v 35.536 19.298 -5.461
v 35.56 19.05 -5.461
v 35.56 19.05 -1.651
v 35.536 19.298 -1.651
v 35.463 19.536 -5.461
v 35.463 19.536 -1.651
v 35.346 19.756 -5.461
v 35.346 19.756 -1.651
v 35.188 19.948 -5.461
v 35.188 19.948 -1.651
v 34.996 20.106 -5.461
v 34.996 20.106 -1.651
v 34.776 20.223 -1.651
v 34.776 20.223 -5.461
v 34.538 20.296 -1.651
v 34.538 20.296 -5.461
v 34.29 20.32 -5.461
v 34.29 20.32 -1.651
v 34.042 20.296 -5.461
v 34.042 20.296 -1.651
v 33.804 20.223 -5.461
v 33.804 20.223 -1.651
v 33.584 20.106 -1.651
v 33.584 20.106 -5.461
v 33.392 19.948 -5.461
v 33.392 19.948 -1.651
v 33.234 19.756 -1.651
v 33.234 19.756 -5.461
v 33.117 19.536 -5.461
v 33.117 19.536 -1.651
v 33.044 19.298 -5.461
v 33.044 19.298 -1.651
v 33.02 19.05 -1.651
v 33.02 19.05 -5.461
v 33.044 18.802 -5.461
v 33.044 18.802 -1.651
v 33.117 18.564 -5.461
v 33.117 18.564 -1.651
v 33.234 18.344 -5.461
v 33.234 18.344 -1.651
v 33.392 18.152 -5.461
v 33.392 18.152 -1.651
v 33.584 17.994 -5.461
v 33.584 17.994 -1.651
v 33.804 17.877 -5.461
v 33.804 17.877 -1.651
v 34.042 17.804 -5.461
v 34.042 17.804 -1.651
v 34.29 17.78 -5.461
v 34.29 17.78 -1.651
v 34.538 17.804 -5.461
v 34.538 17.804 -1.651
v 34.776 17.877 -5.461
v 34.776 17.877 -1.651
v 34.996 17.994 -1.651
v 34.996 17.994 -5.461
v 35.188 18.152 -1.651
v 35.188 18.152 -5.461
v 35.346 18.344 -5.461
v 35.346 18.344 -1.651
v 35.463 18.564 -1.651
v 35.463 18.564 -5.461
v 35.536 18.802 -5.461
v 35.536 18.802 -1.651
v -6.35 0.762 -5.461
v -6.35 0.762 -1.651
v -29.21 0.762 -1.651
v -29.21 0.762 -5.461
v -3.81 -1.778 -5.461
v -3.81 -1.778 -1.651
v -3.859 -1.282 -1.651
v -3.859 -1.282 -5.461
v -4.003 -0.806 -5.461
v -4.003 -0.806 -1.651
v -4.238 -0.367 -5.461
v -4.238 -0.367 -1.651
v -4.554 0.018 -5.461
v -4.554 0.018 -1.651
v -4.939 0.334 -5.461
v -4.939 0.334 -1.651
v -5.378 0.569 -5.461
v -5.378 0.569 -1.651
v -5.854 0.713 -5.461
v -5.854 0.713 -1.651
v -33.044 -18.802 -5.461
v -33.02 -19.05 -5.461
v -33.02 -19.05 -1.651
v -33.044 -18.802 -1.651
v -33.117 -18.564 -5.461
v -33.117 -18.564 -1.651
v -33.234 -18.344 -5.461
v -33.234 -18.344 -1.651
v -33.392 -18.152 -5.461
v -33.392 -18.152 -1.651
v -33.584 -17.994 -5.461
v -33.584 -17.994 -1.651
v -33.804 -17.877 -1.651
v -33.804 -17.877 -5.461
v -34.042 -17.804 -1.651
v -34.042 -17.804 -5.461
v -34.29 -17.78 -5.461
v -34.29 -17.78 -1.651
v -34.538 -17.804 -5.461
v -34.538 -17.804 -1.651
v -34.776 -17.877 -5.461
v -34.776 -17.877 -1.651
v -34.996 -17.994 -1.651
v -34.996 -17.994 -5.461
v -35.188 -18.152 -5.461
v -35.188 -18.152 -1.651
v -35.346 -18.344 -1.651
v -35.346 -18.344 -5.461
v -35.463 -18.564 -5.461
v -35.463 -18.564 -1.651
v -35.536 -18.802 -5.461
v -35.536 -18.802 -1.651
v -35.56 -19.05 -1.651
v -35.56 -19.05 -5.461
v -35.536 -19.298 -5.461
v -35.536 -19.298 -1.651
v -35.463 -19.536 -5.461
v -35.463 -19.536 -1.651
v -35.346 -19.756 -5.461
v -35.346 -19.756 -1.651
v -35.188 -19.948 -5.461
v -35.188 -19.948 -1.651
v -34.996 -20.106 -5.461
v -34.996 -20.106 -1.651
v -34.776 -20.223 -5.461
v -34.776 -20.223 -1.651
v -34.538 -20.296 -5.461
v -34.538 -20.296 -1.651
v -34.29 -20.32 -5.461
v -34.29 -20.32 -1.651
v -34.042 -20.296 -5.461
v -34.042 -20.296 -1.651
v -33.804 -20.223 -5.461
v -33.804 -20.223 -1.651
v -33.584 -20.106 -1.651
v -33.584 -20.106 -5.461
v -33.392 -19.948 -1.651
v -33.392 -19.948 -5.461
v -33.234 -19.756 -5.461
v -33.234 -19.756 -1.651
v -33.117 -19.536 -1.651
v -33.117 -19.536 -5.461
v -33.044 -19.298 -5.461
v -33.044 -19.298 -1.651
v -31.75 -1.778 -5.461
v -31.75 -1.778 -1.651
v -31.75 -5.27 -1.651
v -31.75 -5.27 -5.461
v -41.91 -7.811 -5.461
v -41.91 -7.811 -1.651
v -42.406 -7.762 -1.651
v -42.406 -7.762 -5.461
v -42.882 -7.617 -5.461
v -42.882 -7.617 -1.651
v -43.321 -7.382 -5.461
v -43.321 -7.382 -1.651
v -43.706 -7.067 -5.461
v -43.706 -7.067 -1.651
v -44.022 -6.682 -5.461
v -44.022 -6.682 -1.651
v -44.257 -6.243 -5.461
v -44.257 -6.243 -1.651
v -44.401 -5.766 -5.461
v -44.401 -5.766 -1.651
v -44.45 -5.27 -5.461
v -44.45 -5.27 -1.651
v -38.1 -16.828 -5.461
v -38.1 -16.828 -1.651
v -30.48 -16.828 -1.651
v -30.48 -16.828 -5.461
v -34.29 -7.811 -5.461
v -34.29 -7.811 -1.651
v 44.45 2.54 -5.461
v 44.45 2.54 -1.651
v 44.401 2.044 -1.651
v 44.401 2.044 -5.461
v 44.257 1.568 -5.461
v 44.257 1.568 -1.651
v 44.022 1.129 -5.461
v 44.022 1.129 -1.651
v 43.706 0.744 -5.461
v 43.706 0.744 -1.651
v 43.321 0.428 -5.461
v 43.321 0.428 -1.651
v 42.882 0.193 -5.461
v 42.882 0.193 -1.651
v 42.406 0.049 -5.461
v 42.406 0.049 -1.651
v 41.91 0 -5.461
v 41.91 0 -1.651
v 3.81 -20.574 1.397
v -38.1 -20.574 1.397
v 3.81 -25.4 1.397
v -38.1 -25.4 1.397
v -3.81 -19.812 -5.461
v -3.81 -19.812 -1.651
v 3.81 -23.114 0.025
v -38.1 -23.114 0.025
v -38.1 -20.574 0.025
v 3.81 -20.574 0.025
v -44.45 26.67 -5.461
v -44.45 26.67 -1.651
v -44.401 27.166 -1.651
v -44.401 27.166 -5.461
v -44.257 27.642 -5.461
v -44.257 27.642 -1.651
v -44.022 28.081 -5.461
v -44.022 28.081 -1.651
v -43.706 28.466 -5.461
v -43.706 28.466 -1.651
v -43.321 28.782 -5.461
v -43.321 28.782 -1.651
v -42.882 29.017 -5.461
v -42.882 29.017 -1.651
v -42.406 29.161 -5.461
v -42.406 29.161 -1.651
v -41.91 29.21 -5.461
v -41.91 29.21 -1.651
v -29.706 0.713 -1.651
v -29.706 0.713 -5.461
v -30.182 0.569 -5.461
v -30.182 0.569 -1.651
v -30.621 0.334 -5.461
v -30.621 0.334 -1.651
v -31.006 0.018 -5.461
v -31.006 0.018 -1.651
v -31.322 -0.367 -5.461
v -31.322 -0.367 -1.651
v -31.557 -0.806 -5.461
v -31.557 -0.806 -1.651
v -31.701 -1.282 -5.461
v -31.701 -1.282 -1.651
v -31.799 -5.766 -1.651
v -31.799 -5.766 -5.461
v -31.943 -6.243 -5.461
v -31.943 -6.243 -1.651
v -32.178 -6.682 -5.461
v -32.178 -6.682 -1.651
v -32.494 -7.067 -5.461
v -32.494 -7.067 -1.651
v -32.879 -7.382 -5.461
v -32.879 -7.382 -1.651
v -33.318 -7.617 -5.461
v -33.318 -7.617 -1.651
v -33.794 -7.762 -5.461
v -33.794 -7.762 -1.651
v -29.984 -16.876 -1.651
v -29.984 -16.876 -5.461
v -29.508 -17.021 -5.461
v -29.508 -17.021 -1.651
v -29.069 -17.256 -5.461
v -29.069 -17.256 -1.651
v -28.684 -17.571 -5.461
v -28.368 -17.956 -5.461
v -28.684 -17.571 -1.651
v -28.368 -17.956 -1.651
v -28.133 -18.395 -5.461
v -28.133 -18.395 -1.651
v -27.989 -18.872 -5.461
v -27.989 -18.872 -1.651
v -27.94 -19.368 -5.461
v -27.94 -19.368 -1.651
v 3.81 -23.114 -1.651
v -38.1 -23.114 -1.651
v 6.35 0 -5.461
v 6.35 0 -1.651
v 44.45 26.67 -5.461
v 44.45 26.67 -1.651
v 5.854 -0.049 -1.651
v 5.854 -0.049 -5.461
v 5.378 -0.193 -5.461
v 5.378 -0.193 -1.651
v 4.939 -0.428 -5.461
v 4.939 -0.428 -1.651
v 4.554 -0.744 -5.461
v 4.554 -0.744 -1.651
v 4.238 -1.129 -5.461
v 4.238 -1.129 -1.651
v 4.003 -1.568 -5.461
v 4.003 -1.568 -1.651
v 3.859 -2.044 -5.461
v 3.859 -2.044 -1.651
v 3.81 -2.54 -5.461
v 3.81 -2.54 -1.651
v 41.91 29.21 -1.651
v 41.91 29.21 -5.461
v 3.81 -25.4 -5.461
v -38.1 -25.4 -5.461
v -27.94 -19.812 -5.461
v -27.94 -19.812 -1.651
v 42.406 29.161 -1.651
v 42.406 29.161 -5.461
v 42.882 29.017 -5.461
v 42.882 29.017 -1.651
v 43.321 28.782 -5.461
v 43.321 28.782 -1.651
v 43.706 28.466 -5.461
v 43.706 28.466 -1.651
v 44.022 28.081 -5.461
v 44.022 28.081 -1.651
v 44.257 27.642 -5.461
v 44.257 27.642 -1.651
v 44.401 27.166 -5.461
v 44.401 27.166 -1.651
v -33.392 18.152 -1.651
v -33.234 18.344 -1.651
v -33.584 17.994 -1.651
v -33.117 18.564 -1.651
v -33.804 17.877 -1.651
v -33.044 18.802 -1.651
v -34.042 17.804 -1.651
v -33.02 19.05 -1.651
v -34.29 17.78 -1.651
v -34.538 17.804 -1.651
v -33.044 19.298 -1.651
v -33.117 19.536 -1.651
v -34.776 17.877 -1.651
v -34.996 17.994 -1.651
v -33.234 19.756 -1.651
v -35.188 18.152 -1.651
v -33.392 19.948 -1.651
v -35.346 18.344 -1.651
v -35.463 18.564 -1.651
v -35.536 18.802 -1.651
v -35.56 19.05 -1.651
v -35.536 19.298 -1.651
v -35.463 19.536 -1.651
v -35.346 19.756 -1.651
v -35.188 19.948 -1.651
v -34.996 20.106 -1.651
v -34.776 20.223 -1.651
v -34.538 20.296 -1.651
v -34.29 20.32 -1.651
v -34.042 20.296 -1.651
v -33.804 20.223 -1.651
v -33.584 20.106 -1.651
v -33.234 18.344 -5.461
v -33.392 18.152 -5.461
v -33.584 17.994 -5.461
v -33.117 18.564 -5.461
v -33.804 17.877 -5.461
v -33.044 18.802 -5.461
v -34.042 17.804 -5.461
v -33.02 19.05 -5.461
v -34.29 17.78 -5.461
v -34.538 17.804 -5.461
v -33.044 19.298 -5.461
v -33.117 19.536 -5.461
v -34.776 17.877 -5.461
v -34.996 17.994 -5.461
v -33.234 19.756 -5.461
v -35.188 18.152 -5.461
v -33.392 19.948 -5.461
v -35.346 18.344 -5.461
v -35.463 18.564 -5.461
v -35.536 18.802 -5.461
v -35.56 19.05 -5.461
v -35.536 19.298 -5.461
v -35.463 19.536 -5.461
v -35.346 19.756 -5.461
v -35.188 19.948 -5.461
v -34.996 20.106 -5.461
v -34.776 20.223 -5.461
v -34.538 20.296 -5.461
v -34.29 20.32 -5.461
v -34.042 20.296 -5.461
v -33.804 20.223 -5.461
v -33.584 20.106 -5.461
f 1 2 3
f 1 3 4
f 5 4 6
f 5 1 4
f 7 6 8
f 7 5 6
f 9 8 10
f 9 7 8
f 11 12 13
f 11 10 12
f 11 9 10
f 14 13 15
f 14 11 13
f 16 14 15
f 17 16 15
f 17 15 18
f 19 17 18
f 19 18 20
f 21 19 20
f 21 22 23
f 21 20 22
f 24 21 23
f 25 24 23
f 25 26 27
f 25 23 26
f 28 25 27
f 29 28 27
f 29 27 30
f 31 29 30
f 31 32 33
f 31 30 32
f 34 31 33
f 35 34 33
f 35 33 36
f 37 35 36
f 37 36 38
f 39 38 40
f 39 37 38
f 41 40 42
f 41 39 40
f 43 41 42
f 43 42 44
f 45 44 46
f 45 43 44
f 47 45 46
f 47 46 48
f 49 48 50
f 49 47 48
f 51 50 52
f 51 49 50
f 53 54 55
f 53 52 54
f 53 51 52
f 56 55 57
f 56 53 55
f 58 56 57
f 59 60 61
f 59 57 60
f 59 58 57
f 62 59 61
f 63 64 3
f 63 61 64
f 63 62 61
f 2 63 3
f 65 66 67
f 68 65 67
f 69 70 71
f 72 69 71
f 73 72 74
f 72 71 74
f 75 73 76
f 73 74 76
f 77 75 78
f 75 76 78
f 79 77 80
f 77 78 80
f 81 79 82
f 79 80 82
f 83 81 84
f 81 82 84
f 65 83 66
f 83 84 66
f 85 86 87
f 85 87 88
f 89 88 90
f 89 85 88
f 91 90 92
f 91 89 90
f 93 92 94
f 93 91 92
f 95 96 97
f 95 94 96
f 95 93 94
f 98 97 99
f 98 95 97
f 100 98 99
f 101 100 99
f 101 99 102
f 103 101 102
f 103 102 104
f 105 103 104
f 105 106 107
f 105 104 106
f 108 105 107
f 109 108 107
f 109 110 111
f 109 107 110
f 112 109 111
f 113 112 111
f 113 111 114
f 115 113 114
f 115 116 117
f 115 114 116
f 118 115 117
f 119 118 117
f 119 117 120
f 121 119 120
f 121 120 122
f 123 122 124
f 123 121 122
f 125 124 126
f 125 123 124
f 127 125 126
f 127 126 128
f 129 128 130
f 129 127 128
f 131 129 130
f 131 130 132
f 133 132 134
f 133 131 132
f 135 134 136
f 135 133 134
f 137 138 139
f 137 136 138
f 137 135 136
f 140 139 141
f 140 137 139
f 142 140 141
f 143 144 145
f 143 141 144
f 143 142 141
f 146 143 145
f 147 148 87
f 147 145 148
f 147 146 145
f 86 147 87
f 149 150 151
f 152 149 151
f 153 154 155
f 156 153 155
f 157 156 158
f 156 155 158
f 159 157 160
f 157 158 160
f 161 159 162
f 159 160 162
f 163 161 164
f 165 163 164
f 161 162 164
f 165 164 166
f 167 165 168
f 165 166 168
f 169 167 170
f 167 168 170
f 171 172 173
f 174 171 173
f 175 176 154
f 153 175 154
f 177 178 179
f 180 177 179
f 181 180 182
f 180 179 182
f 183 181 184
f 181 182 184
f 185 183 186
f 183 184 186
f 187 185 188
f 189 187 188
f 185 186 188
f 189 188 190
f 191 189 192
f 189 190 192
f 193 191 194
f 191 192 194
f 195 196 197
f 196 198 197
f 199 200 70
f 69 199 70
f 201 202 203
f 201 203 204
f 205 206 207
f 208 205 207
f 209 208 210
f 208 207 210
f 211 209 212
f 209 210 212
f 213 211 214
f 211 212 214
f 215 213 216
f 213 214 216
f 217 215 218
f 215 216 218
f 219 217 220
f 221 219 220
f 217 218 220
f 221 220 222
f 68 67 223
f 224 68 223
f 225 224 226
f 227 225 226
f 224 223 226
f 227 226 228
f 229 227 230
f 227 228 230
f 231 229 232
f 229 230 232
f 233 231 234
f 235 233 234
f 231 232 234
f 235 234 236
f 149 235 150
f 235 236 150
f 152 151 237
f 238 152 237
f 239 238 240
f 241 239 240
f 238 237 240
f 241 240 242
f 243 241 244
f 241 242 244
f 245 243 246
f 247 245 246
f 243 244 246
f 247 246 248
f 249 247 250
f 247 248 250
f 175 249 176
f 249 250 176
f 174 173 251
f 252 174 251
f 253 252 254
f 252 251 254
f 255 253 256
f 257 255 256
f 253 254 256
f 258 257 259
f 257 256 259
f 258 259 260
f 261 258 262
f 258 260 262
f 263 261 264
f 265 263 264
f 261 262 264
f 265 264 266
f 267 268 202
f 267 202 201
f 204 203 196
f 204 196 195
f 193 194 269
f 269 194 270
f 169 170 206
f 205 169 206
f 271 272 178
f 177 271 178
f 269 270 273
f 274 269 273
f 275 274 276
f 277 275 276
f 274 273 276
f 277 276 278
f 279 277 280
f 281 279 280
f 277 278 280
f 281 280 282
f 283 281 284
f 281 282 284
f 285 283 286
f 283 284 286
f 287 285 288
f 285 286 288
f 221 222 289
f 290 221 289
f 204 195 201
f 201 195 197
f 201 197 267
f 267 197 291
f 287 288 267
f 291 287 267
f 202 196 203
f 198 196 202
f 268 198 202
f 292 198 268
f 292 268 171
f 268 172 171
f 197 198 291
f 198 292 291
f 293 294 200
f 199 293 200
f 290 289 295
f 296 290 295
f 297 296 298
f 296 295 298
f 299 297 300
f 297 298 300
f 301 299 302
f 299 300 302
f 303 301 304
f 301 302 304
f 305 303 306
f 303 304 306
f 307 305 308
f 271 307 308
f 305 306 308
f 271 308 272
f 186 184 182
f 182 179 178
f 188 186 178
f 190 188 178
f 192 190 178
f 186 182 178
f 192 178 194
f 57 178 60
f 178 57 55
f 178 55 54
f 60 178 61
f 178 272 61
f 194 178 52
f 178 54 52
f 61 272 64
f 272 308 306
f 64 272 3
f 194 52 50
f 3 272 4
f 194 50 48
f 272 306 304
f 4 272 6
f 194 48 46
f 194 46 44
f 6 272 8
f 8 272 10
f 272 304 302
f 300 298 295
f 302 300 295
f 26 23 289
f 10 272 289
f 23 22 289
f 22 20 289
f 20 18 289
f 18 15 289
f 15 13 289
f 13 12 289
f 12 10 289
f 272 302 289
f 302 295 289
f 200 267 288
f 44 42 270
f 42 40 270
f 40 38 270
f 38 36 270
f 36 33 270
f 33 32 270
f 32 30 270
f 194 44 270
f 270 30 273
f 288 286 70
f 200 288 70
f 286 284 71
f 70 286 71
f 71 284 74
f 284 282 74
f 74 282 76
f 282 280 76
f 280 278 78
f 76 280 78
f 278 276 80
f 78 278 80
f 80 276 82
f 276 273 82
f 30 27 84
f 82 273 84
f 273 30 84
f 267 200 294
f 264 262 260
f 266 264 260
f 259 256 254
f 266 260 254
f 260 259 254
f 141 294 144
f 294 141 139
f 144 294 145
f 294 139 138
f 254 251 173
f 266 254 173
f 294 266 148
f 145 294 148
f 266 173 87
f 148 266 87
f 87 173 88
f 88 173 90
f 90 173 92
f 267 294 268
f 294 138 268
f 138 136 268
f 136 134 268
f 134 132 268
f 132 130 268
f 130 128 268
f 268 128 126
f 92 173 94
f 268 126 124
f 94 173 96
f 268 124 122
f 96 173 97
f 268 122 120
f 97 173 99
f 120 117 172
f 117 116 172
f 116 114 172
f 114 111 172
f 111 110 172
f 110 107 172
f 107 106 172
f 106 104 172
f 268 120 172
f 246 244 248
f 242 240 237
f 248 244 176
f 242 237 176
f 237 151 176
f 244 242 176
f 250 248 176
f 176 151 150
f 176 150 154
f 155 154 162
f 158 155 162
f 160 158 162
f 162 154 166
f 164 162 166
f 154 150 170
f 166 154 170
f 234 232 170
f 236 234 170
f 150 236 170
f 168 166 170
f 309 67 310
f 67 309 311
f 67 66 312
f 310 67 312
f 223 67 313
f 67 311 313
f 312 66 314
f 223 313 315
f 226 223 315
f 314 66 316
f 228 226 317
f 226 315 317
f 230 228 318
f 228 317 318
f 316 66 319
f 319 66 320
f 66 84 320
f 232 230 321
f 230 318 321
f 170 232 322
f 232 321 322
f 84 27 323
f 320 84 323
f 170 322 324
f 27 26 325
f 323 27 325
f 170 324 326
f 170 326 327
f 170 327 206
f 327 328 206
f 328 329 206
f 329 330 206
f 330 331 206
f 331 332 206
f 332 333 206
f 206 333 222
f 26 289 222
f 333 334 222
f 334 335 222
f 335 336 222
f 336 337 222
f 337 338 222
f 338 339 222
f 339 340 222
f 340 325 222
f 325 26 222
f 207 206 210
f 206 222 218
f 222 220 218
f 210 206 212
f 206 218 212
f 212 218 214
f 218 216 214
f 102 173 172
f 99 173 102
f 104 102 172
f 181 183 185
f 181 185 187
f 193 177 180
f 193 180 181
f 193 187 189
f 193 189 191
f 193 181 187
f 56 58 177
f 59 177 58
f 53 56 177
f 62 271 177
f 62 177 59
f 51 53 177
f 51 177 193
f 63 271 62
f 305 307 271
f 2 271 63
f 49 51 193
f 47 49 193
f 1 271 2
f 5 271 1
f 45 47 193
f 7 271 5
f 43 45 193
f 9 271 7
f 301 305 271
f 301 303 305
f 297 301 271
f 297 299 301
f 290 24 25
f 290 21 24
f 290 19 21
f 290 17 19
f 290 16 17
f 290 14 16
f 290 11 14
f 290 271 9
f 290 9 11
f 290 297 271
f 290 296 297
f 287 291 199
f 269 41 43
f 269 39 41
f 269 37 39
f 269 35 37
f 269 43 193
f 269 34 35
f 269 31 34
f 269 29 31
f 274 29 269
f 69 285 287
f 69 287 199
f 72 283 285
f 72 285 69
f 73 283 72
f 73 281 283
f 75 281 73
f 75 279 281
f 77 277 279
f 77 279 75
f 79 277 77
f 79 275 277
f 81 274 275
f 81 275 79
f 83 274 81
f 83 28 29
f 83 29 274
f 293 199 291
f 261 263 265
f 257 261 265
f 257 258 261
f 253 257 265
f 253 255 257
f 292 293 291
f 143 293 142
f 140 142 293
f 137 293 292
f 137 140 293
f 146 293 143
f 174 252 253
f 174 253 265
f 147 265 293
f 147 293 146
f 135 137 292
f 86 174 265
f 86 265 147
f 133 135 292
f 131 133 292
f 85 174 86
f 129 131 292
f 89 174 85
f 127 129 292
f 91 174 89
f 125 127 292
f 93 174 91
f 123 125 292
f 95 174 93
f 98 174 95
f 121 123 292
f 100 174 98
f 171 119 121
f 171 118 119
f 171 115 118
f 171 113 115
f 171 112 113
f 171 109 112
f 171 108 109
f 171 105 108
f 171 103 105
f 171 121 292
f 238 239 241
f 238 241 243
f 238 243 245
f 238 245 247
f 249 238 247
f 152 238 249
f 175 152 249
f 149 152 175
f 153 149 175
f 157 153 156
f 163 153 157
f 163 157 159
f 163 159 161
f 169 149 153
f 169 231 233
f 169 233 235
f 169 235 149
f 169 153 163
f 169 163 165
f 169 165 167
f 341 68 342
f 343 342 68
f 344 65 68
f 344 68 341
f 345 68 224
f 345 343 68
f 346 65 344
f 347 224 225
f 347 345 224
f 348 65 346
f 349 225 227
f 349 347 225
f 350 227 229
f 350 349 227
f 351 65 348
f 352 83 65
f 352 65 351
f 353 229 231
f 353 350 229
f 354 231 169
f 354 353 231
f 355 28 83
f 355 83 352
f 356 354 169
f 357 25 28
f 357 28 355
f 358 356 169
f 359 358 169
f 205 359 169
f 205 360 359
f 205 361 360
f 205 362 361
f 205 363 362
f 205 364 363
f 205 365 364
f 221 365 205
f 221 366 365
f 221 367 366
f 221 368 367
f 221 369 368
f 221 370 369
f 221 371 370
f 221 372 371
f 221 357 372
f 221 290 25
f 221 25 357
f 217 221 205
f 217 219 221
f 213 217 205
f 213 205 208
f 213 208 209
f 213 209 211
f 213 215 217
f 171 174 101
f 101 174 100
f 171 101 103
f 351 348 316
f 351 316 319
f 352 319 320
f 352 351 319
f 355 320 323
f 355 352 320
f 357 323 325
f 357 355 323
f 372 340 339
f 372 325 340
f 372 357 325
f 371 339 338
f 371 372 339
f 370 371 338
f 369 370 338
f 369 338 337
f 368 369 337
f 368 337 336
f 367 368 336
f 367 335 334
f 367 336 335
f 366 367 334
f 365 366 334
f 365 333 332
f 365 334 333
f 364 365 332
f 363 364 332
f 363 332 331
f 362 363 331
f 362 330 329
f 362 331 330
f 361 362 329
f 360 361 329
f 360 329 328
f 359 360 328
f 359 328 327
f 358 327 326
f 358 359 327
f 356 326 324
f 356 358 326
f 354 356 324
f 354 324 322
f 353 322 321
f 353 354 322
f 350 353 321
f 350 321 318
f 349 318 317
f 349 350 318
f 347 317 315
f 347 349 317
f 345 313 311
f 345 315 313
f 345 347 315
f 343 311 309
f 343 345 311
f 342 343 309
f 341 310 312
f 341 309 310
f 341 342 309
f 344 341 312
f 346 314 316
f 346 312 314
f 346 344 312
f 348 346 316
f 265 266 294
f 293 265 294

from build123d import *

# Parameters (mm, degrees)
BOSS_EXTRUDE1_DEPTH     = 3.81
SKETCH3_W               = 41.91
SKETCH3_H               = 2.286
BOSS_EXTRUDE2_DEPTH     = 3.048
SKETCH4_W               = 41.91
SKETCH4_H               = 1.3716
BOSS_EXTRUDE3_DEPTH     = 2.54
CUT_EXTRUDE1_DEPTH      = 54.324878809
CUT_EXTRUDE1_DEPTH_BACK = 54.324878809
SKETCH5_R               = 1.27


with BuildPart() as part:
    # Sketch2 → Boss-Extrude1 (new body)
    with BuildSketch(Plane(origin=(0, 0, -1.651), x_dir=(-1, 0, 0), z_dir=(0, 0, -1))):
        with BuildLine():
            Line((-44.45, 26.67), (-44.45, 5.378493099))
            Line((-44.45, 5.378493099), (-44.45, 2.54))
            ThreePointArc((-44.45, 2.54), (-43.706051224, 0.743948776), (-41.91, 0))
            Line((-41.91, 0), (-6.35, 0))
            ThreePointArc((-6.35, 0), (-4.553948776, -0.743948776), (-3.81, -2.54))
            Line((-3.81, -2.54), (-3.81, -22.86))
            Line((-3.81, -22.86), (-3.81, -25.4))
            Line((-3.81, -25.4), (38.1, -25.4))
            Line((38.1, -25.4), (38.1, -22.86))
            Line((38.1, -22.86), (38.1, -16.8275))
            Line((38.1, -16.8275), (30.48, -16.8275))
            ThreePointArc((30.48, -16.8275), (28.683948776, -17.571448776), (27.94, -19.3675))
            Line((27.94, -19.3675), (27.94, -19.812))
            Line((27.94, -19.812), (3.81, -19.812))
            Line((3.81, -19.812), (3.81, -1.778))
            ThreePointArc((3.81, -1.778), (4.553948776, 0.018051224), (6.35, 0.762))
            Line((6.35, 0.762), (29.21, 0.762))
            ThreePointArc((29.21, 0.762), (31.006051224, 0.018051224), (31.75, -1.778))
            Line((31.75, -1.778), (31.75, -5.2705))
            ThreePointArc((31.75, -5.2705), (32.493948776, -7.066551224), (34.29, -7.8105))
            Line((34.29, -7.8105), (41.91, -7.8105))
            ThreePointArc((41.91, -7.8105), (43.706051224, -7.066551224), (44.45, -5.2705))
            Line((44.45, -5.2705), (44.45, 26.67))
            ThreePointArc((44.45, 26.67), (43.706051224, 28.466051224), (41.91, 29.21))
            Line((41.91, 29.21), (-41.91, 29.21))
            ThreePointArc((-41.91, 29.21), (-43.706051224, 28.466051224), (-44.45, 26.67))
        make_face()
    extrude(amount=BOSS_EXTRUDE1_DEPTH)

    # Sketch3 → Boss-Extrude2 (add)
    with BuildSketch(Plane.XY.offset(-1.651)):
        with Locations((-17.145, -24.257)):
            Rectangle(SKETCH3_W, SKETCH3_H)
    extrude(amount=BOSS_EXTRUDE2_DEPTH)

    # Sketch4 → Boss-Extrude3 (add)
    with BuildSketch(Plane(origin=(0, -23.114, 0), x_dir=(1, 0, 0), z_dir=(0, 1, 0))):
        with Locations((-17.145, -0.7112)):
            Rectangle(SKETCH4_W, SKETCH4_H)
    extrude(amount=BOSS_EXTRUDE3_DEPTH)

    # Sketch5 → Cut-Extrude1 (cut, two sides: drawn at the far end of the back side and taken through both)
    with BuildSketch(Plane.XY.offset(-1.651).offset(-CUT_EXTRUDE1_DEPTH_BACK)):
        with Locations((-34.29, 19.05)):
            Circle(SKETCH5_R)
        with Locations((34.29, 19.05)):
            Circle(SKETCH5_R)
        with Locations((-34.29, -19.05)):
            Circle(SKETCH5_R)
    extrude(amount=CUT_EXTRUDE1_DEPTH + CUT_EXTRUDE1_DEPTH_BACK, mode=Mode.SUBTRACT)


solid = part.part
